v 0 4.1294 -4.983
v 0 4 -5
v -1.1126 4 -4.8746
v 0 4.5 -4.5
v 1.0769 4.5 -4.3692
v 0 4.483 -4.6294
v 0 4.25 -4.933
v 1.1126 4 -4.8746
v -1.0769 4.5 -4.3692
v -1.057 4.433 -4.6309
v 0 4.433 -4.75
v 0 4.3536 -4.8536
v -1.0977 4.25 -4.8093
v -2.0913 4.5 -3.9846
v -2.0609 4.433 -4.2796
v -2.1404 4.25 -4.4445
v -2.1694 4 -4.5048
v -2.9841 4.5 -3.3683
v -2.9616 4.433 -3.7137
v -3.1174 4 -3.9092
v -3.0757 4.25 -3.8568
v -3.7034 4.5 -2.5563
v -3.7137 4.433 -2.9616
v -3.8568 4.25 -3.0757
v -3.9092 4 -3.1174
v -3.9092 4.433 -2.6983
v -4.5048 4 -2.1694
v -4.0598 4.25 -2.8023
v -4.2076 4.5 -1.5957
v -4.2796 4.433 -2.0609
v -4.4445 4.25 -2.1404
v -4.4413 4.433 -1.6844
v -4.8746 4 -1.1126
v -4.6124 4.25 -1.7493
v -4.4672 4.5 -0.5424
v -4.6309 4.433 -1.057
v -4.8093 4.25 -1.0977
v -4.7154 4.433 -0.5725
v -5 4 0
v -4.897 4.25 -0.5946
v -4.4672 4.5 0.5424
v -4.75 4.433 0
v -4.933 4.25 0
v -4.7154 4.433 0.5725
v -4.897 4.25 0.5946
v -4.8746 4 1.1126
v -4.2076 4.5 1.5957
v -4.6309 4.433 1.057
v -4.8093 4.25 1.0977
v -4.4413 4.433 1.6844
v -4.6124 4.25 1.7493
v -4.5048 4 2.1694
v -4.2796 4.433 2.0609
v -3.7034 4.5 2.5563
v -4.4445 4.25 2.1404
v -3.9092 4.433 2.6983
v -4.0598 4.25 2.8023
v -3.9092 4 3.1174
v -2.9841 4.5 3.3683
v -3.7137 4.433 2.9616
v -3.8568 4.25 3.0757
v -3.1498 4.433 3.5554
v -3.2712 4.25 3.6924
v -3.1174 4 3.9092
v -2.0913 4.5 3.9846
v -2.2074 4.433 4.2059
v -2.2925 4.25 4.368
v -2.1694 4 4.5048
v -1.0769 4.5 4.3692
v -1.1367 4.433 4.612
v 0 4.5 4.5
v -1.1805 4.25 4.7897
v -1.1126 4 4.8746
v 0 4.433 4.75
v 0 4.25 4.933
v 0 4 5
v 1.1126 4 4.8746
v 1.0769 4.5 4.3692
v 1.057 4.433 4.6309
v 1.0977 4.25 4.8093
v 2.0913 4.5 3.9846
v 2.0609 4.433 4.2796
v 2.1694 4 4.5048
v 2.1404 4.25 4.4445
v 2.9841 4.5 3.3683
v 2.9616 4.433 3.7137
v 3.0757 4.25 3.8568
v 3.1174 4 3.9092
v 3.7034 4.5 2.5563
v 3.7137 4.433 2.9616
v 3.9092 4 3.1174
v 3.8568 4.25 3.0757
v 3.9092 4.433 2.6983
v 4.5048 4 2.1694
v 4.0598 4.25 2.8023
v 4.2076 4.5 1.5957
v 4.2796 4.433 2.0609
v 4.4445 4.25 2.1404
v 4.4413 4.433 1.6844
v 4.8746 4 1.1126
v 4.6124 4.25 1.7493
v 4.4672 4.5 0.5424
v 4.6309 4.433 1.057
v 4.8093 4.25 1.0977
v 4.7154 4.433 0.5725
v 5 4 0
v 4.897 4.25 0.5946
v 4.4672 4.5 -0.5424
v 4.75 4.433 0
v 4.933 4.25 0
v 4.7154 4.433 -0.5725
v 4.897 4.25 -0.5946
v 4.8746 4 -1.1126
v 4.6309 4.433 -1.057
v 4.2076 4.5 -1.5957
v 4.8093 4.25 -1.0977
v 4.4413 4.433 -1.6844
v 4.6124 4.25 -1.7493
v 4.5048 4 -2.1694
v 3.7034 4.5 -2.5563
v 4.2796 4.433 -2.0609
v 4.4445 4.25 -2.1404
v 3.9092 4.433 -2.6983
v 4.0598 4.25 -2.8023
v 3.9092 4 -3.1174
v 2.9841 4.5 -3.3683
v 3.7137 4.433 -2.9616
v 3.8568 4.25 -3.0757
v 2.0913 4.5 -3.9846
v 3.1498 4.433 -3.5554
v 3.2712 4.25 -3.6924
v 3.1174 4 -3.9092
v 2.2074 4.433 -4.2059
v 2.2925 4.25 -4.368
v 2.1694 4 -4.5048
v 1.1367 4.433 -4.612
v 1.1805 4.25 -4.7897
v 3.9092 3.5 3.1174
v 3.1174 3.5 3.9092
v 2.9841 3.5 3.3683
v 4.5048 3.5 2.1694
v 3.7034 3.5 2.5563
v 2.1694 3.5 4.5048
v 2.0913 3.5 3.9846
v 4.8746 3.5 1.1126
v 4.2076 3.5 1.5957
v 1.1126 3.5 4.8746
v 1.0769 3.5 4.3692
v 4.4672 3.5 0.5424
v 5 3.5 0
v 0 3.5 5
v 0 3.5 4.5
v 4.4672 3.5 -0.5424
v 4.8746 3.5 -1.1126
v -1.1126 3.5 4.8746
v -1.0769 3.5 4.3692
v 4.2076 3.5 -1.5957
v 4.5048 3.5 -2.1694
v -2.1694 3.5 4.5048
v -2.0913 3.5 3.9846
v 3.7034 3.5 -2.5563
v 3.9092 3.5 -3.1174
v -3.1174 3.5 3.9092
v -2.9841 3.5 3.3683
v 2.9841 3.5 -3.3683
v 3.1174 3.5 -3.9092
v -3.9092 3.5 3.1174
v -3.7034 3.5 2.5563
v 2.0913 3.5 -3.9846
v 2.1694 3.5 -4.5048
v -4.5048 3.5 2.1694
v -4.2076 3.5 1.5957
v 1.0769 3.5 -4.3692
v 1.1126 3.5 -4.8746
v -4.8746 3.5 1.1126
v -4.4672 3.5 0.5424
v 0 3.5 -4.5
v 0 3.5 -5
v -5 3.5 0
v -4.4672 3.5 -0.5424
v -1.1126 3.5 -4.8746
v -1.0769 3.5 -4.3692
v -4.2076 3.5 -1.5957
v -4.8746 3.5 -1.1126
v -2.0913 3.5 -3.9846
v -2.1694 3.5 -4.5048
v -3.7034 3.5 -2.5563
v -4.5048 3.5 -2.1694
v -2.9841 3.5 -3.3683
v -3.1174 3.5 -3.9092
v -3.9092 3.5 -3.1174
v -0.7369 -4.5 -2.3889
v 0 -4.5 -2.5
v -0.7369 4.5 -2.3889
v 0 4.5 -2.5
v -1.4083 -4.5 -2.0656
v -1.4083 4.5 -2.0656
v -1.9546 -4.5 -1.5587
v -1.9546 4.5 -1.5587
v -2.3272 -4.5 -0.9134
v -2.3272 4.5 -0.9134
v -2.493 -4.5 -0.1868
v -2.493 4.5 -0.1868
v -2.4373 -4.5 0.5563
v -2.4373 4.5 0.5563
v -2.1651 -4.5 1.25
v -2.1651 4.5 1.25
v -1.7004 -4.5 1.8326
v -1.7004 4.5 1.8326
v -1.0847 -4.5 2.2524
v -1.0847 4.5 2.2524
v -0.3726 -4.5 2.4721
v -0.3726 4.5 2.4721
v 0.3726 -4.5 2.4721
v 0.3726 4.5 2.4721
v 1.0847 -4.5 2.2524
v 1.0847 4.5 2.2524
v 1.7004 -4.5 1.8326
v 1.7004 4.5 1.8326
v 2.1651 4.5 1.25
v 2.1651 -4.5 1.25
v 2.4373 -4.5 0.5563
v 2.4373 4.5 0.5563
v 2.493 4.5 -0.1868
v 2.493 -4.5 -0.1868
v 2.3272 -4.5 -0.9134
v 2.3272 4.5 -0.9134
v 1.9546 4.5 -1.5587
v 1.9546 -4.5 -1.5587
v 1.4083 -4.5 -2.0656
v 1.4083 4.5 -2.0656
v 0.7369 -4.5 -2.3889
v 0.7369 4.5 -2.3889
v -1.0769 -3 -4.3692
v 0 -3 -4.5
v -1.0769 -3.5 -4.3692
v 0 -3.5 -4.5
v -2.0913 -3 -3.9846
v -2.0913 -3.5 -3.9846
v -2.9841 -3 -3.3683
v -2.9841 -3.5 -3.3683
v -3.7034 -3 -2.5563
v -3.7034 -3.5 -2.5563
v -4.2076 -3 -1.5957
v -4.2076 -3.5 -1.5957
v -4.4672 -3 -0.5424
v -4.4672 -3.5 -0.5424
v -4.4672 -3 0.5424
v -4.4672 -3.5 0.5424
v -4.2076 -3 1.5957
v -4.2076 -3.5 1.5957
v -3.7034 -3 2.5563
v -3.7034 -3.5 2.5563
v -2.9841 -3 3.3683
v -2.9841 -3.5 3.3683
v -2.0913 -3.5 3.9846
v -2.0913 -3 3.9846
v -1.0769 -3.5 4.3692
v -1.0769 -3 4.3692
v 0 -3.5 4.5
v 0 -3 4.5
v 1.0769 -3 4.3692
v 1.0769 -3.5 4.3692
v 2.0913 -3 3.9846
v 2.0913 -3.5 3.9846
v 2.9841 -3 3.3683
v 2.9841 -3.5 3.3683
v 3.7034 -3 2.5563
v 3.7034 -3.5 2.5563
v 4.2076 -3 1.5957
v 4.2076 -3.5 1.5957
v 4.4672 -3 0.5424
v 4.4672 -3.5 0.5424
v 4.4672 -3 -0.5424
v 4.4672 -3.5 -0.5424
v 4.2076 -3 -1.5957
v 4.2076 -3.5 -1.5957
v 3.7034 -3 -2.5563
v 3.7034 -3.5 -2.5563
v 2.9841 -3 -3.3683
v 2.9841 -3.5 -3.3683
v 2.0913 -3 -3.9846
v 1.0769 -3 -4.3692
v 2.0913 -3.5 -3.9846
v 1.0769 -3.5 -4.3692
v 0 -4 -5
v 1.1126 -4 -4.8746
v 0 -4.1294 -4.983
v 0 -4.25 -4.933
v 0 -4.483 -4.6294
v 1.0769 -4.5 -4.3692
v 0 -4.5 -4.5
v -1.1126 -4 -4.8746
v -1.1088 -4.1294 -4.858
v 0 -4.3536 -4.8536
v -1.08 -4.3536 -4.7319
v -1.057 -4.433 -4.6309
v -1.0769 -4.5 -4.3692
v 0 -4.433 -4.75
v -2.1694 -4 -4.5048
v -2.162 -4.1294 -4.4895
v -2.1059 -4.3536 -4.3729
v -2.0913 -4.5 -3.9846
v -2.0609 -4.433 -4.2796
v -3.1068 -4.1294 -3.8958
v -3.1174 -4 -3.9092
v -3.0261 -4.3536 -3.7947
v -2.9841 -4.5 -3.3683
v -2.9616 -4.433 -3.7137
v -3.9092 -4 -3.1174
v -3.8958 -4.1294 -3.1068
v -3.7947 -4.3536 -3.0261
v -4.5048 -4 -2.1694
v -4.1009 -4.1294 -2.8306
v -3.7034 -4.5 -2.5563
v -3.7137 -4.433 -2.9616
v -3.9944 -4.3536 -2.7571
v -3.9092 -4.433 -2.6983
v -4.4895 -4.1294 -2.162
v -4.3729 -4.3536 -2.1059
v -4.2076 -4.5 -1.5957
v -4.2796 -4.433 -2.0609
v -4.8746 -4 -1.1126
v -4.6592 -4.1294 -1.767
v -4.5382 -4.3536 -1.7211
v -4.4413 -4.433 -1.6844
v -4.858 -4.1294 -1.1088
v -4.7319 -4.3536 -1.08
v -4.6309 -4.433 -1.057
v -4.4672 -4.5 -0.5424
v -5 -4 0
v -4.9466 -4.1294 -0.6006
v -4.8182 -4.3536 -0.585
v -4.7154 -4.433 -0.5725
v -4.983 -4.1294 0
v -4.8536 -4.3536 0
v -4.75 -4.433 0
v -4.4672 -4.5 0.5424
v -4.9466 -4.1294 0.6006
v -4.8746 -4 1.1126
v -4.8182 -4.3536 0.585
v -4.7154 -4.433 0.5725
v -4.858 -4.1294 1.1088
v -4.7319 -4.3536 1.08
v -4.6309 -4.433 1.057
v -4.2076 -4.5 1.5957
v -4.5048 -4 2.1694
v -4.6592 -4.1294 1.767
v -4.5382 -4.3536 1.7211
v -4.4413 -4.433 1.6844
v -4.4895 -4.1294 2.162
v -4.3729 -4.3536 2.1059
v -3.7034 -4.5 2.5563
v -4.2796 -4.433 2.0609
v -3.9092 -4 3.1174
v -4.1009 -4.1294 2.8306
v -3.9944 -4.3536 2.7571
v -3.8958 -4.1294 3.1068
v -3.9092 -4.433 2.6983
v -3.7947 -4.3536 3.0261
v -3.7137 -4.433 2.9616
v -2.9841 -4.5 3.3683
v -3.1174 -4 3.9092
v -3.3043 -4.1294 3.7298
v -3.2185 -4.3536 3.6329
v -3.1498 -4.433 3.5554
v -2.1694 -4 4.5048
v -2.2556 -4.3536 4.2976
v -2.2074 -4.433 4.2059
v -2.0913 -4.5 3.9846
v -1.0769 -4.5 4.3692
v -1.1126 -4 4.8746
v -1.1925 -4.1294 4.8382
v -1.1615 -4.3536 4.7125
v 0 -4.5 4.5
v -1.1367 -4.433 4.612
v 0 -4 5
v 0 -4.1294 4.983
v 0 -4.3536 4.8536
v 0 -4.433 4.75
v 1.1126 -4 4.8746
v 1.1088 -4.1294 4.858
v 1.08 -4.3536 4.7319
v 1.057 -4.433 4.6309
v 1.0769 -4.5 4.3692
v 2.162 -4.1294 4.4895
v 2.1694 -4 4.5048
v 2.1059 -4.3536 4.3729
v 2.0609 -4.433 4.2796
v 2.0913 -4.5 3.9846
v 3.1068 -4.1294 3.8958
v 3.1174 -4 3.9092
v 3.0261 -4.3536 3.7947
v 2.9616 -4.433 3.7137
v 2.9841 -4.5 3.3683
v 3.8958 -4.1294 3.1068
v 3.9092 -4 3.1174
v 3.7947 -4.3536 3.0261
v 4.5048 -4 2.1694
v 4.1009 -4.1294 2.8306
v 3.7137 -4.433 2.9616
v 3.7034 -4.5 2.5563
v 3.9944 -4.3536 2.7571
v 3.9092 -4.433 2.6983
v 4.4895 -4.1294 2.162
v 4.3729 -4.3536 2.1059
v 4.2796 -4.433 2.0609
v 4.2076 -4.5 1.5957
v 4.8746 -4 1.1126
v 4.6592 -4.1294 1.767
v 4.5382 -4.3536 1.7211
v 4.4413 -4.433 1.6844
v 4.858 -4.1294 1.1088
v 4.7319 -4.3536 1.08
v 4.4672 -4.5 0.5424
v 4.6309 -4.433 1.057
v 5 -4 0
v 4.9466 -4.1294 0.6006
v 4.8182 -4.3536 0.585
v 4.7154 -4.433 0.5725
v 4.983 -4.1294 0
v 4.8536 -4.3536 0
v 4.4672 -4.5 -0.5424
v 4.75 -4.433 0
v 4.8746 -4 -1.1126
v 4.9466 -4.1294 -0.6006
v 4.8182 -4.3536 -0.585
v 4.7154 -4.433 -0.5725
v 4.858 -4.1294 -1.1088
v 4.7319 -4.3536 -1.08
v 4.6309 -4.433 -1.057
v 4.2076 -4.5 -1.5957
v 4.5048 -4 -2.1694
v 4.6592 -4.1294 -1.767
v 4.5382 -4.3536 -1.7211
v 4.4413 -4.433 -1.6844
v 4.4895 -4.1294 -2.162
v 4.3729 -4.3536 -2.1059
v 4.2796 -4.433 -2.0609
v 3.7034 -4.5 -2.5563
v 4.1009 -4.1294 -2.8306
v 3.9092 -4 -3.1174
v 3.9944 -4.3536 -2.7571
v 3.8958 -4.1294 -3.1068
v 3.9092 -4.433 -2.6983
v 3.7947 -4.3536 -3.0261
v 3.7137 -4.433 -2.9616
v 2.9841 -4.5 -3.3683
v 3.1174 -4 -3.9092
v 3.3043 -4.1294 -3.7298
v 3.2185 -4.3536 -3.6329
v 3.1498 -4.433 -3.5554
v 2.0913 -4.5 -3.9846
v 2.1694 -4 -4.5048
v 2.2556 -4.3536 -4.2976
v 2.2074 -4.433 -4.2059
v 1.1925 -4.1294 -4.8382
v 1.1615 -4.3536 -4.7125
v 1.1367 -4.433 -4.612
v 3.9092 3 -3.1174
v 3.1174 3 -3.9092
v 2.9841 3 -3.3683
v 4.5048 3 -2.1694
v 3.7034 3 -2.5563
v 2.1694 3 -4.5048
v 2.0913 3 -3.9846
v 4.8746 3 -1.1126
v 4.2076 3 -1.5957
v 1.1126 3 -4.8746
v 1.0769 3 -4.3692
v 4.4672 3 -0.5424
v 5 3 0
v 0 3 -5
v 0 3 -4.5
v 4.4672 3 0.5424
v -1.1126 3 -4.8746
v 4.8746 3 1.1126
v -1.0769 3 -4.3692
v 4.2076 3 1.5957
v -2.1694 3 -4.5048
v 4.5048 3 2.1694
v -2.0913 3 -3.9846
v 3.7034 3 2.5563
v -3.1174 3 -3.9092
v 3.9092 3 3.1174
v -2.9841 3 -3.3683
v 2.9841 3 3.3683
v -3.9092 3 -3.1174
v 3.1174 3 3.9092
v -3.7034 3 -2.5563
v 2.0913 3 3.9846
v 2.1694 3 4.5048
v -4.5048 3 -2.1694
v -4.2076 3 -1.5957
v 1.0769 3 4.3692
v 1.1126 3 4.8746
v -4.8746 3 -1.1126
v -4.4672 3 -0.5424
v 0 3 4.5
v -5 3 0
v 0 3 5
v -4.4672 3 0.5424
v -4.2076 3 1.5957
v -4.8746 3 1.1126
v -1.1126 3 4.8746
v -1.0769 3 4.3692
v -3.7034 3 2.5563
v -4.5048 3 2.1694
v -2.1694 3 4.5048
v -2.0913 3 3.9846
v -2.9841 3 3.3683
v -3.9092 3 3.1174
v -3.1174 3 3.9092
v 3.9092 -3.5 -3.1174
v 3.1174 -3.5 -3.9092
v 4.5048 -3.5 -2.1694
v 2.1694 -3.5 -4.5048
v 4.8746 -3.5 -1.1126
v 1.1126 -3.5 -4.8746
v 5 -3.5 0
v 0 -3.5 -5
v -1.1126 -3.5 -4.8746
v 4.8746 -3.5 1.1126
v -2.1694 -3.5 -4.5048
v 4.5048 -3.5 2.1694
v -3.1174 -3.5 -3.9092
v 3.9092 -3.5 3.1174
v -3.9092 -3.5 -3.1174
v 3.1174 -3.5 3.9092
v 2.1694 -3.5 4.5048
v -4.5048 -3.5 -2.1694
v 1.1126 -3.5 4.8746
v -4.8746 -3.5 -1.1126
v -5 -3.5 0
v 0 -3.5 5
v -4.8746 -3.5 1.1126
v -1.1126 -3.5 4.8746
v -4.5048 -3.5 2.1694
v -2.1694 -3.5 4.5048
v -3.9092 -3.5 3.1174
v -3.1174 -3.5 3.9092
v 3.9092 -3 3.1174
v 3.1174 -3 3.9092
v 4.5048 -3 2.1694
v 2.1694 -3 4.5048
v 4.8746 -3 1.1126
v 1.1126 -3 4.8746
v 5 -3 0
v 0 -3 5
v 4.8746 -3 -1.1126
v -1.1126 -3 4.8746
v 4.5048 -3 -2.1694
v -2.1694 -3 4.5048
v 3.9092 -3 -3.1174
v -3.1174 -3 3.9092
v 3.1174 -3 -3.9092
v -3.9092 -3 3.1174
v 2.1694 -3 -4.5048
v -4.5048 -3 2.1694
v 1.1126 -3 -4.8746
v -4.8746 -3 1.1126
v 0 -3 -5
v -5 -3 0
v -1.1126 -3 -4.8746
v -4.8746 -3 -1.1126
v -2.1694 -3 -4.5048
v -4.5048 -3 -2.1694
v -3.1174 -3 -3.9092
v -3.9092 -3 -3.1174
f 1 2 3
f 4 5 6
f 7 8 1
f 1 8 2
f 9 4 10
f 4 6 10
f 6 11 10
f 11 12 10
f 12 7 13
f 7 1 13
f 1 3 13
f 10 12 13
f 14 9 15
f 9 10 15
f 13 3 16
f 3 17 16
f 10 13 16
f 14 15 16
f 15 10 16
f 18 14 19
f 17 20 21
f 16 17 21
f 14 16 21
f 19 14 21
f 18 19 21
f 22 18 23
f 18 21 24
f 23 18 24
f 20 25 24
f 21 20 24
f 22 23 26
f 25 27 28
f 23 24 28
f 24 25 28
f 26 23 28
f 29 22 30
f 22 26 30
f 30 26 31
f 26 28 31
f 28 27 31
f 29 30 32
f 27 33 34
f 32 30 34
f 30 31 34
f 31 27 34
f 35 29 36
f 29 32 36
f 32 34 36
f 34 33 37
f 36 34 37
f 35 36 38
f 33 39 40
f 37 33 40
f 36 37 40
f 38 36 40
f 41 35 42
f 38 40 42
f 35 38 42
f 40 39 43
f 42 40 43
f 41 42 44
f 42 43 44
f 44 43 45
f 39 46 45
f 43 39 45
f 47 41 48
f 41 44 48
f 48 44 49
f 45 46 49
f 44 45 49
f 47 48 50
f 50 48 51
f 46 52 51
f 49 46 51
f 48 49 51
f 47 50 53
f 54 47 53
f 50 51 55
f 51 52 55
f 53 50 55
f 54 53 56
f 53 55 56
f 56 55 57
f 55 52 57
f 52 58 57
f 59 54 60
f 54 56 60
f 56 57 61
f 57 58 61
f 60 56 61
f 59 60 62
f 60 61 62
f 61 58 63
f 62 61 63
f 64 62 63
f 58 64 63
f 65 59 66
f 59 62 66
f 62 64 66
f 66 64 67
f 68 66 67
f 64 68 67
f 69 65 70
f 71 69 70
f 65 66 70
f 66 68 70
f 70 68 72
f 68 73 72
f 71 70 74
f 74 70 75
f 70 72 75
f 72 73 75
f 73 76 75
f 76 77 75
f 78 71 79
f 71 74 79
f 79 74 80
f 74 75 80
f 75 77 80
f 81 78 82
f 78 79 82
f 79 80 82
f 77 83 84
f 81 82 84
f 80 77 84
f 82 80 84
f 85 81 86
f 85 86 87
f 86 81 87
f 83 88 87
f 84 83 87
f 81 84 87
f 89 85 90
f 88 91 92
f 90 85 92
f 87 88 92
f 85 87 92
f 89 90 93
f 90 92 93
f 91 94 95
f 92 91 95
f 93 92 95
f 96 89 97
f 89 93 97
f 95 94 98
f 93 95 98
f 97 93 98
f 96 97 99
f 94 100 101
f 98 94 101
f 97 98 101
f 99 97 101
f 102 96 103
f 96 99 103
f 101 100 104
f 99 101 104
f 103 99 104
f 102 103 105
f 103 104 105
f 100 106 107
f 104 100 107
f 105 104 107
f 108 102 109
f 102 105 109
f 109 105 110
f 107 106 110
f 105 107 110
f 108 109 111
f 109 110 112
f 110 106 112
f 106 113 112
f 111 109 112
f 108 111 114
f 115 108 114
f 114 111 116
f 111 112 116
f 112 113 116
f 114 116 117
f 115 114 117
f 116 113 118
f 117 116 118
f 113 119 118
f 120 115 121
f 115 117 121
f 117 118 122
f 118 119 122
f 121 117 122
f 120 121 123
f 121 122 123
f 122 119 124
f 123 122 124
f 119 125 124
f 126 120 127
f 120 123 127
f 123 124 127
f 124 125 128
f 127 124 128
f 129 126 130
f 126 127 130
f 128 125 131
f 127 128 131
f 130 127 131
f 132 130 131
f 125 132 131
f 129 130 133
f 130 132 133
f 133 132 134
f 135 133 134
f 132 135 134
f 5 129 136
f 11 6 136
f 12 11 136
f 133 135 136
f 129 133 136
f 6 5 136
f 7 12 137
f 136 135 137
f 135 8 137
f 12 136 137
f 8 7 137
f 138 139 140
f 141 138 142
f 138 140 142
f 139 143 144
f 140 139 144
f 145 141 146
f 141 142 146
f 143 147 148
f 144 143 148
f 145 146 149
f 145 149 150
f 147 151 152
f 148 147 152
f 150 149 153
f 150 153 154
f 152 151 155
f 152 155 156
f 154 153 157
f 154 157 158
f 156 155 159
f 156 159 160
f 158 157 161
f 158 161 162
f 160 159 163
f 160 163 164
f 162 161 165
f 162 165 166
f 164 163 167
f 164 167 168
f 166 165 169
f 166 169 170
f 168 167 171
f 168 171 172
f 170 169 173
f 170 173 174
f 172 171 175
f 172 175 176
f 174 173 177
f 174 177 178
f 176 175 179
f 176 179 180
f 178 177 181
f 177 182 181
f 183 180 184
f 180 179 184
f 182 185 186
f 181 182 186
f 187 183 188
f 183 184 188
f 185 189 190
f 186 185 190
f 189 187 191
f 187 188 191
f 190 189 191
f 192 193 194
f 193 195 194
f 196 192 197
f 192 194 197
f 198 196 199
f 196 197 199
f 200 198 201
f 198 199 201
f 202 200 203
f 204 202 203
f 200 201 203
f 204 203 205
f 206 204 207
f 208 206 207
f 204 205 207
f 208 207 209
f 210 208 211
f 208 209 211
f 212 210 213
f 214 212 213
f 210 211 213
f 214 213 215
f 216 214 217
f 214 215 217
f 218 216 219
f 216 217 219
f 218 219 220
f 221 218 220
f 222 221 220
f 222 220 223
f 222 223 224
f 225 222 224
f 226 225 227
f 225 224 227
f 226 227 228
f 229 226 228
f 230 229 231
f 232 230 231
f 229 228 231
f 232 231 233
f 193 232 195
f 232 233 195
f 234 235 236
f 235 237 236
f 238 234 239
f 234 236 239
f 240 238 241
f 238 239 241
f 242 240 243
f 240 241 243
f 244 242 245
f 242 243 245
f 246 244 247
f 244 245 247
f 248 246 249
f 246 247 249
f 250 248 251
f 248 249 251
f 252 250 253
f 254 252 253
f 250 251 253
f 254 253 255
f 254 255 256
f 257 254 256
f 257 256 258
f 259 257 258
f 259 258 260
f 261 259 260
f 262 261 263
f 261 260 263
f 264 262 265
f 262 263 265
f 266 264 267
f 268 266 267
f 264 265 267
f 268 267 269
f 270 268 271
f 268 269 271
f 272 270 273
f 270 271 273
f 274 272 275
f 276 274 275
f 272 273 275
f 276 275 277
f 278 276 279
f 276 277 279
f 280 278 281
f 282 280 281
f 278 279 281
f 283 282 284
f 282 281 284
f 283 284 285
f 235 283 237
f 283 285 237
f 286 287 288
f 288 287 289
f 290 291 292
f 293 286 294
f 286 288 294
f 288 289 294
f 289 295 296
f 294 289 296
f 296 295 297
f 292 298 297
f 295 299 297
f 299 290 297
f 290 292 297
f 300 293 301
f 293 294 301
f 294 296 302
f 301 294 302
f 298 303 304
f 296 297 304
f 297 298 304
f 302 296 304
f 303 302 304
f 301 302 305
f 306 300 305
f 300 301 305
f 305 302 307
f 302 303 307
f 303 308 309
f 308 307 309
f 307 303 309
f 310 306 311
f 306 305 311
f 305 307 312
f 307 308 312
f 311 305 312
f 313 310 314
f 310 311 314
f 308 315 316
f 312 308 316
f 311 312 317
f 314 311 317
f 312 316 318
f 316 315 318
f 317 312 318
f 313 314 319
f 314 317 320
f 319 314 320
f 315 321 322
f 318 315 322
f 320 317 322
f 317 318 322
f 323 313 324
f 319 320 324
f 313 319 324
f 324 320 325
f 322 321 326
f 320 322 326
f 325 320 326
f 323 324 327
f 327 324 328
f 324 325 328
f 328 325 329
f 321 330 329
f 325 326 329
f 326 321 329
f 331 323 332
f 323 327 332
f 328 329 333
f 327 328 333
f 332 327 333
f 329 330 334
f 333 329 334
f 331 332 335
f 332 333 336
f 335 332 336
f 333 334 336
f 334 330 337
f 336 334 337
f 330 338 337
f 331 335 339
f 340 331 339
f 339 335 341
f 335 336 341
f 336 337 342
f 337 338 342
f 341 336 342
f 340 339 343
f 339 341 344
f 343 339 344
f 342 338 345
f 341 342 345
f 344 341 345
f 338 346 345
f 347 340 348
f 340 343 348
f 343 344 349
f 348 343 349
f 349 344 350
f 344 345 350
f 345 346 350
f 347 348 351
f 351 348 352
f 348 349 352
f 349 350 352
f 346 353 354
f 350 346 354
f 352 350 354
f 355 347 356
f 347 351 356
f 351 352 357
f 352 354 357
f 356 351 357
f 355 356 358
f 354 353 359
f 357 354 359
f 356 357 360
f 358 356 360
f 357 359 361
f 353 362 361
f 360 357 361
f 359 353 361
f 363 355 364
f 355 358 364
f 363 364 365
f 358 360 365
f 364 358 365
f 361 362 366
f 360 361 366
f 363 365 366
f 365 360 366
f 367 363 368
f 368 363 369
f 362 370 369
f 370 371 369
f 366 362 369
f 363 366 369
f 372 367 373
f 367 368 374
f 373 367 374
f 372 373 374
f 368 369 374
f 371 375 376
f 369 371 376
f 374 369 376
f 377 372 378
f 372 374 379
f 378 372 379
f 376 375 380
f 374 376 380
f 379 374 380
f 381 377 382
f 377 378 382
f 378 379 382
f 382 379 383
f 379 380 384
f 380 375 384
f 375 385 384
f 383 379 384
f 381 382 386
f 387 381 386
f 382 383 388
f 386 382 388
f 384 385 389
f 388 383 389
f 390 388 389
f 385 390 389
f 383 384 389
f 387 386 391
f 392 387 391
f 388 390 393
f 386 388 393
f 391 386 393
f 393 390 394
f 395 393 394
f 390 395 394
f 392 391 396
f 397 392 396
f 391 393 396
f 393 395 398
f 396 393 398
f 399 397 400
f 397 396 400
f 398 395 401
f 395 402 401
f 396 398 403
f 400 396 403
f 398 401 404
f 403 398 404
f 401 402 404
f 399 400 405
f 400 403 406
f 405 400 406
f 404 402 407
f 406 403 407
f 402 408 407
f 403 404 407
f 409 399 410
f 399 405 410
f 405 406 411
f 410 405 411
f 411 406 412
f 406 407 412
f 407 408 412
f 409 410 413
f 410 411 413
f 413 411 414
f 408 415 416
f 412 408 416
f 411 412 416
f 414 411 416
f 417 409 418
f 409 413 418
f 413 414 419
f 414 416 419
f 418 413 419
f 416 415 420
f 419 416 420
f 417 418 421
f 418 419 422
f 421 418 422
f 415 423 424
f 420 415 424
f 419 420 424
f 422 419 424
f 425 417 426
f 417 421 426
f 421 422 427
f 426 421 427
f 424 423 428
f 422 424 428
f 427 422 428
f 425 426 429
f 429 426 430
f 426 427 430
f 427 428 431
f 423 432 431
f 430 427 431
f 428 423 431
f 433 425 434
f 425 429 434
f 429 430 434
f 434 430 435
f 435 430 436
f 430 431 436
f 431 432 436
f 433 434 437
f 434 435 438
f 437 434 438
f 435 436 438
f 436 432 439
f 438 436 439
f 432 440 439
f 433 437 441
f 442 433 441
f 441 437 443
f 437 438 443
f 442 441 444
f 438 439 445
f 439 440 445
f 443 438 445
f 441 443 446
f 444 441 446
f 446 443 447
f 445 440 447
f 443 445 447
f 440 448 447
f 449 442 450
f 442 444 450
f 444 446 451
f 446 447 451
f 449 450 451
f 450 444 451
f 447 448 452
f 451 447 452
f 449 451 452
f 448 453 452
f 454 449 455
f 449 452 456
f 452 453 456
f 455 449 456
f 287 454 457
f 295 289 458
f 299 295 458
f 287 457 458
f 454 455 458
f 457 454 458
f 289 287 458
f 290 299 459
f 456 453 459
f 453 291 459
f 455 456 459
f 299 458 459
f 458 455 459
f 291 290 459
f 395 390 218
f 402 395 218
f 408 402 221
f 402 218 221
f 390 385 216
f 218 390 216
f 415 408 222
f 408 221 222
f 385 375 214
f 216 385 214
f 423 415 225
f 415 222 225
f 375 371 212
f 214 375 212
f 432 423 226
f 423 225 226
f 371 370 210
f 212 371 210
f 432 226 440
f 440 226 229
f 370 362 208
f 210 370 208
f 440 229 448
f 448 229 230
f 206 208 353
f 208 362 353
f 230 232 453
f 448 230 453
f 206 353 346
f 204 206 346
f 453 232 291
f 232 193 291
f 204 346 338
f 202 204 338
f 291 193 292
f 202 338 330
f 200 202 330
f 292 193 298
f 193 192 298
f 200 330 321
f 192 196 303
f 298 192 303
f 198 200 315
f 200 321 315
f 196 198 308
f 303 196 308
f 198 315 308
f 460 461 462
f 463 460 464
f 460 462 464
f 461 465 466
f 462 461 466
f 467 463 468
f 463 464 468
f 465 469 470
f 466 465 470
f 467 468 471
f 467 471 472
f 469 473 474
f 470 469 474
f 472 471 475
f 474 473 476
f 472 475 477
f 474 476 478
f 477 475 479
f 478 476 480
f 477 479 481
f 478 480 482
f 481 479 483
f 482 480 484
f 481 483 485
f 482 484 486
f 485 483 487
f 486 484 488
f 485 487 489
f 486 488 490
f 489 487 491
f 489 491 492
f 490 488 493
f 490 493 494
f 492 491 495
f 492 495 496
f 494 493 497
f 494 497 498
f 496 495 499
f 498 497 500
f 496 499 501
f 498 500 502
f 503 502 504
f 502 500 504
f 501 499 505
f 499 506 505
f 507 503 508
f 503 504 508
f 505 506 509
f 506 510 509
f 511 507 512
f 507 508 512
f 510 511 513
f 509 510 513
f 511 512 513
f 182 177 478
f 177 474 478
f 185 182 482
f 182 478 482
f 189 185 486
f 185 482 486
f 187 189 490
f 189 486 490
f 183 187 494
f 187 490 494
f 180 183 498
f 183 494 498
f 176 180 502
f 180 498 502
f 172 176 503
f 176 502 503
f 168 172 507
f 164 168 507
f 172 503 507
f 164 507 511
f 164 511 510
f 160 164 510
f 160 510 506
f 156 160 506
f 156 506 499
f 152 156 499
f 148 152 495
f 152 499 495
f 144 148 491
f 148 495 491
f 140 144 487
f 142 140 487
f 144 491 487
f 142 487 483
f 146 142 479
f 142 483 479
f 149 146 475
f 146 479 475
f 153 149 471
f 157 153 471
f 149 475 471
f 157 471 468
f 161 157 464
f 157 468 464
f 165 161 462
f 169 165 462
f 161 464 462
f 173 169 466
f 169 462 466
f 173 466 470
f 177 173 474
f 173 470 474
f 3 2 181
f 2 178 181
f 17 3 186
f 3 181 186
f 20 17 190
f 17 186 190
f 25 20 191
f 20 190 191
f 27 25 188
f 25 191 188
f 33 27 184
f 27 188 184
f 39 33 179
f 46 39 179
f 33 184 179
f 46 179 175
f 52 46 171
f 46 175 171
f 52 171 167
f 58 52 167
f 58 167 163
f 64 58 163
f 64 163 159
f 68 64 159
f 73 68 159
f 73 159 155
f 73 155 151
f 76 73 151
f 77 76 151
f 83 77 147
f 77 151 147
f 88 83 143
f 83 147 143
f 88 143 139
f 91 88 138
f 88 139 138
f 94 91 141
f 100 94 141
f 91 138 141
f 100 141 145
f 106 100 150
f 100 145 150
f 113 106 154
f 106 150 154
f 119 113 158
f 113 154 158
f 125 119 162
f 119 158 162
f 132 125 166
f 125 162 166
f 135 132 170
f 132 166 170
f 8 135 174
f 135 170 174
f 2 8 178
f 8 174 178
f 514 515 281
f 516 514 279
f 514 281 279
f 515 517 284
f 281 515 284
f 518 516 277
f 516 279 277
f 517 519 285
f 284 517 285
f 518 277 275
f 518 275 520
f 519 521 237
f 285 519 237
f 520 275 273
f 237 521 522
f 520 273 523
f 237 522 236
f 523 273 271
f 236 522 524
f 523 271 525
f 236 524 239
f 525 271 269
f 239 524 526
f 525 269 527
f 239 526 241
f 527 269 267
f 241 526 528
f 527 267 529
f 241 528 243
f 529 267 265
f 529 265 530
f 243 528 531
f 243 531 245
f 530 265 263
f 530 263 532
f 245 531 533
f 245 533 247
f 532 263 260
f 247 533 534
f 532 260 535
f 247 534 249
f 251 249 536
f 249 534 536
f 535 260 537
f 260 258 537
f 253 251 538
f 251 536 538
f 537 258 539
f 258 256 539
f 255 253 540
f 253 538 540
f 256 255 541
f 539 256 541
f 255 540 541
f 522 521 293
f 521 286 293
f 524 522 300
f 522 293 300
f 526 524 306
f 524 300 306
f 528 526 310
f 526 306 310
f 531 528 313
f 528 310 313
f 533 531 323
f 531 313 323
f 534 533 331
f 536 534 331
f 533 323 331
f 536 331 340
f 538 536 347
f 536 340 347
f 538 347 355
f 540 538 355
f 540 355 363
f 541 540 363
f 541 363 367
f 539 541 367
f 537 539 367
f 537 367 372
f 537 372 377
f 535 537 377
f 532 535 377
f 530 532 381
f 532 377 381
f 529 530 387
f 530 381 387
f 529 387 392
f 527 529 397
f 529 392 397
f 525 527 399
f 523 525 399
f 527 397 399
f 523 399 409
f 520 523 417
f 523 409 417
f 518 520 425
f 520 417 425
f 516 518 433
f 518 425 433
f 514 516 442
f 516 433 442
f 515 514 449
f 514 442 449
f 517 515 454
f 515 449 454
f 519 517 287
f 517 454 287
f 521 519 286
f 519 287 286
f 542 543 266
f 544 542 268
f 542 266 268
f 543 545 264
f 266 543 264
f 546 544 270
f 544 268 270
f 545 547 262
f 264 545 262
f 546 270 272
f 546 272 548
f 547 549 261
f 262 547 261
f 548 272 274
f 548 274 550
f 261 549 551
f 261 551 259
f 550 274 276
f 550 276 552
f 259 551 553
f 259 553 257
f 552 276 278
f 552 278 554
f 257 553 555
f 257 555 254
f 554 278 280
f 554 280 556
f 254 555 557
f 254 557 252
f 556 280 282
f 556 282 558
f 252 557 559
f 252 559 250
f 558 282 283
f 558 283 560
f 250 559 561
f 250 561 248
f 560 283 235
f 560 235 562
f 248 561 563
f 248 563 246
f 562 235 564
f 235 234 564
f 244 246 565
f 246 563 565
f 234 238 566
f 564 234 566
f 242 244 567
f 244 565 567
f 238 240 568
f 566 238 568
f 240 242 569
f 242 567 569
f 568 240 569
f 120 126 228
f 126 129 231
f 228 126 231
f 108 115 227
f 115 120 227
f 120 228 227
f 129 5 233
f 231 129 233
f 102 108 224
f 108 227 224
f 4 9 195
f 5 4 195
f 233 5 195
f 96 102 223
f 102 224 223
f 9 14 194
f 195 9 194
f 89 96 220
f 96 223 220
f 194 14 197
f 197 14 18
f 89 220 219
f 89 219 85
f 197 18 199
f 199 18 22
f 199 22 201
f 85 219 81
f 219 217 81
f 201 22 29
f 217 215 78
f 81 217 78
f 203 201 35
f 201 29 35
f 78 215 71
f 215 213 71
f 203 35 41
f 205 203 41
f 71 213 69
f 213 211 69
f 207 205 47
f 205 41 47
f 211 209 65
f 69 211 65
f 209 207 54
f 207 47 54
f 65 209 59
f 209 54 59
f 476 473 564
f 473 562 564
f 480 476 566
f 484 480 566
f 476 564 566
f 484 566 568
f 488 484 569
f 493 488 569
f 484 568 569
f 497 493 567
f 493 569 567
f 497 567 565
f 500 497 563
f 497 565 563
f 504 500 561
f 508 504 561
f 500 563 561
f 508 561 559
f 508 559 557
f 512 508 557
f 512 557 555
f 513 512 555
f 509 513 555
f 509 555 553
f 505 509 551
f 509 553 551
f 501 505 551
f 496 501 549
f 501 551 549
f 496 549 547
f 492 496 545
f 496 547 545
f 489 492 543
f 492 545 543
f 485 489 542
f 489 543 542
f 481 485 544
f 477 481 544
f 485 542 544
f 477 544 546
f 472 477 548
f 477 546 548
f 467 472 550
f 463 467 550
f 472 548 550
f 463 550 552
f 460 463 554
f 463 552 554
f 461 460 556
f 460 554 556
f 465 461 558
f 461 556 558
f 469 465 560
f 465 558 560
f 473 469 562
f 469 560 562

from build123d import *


with BuildPart() as part:
    # Esquisse1 → Révolution1 (revolve)
    with BuildSketch(Plane.XY, mode=Mode.PRIVATE) as r_volution1_sk:
        with BuildLine():
            Line((5, 3), (5, -3))
            Line((5, -3), (4.5, -3))
            Line((4.5, -3), (4.5, -3.5))
            Line((4.5, -3.5), (5, -3.5))
            Line((5, -3.5), (5, -4))
            ThreePointArc((5, -4), (4.853553391, -4.353553391), (4.5, -4.5))
            Line((4.5, -4.5), (2.5, -4.5))
            Line((2.5, -4.5), (2.5, 4.5))
            Line((2.5, 4.5), (4.5, 4.5))
            ThreePointArc((4.5, 4.5), (4.853553391, 4.353553391), (5, 4))
            Line((5, 4), (5, 3.5))
            Line((5, 3.5), (4.5, 3.5))
            Line((4.5, 3.5), (4.5, 3))
            Line((4.5, 3), (5, 3))
        make_face()
    revolve(r_volution1_sk.sketch.rotate(Axis((0, -18.848412698, 0), (0, 1, 0)), 90), axis=Axis((0, -18.848412698, 0), (0, 1, 0)))  # turned: the seam where the file's is


solid = part.part
